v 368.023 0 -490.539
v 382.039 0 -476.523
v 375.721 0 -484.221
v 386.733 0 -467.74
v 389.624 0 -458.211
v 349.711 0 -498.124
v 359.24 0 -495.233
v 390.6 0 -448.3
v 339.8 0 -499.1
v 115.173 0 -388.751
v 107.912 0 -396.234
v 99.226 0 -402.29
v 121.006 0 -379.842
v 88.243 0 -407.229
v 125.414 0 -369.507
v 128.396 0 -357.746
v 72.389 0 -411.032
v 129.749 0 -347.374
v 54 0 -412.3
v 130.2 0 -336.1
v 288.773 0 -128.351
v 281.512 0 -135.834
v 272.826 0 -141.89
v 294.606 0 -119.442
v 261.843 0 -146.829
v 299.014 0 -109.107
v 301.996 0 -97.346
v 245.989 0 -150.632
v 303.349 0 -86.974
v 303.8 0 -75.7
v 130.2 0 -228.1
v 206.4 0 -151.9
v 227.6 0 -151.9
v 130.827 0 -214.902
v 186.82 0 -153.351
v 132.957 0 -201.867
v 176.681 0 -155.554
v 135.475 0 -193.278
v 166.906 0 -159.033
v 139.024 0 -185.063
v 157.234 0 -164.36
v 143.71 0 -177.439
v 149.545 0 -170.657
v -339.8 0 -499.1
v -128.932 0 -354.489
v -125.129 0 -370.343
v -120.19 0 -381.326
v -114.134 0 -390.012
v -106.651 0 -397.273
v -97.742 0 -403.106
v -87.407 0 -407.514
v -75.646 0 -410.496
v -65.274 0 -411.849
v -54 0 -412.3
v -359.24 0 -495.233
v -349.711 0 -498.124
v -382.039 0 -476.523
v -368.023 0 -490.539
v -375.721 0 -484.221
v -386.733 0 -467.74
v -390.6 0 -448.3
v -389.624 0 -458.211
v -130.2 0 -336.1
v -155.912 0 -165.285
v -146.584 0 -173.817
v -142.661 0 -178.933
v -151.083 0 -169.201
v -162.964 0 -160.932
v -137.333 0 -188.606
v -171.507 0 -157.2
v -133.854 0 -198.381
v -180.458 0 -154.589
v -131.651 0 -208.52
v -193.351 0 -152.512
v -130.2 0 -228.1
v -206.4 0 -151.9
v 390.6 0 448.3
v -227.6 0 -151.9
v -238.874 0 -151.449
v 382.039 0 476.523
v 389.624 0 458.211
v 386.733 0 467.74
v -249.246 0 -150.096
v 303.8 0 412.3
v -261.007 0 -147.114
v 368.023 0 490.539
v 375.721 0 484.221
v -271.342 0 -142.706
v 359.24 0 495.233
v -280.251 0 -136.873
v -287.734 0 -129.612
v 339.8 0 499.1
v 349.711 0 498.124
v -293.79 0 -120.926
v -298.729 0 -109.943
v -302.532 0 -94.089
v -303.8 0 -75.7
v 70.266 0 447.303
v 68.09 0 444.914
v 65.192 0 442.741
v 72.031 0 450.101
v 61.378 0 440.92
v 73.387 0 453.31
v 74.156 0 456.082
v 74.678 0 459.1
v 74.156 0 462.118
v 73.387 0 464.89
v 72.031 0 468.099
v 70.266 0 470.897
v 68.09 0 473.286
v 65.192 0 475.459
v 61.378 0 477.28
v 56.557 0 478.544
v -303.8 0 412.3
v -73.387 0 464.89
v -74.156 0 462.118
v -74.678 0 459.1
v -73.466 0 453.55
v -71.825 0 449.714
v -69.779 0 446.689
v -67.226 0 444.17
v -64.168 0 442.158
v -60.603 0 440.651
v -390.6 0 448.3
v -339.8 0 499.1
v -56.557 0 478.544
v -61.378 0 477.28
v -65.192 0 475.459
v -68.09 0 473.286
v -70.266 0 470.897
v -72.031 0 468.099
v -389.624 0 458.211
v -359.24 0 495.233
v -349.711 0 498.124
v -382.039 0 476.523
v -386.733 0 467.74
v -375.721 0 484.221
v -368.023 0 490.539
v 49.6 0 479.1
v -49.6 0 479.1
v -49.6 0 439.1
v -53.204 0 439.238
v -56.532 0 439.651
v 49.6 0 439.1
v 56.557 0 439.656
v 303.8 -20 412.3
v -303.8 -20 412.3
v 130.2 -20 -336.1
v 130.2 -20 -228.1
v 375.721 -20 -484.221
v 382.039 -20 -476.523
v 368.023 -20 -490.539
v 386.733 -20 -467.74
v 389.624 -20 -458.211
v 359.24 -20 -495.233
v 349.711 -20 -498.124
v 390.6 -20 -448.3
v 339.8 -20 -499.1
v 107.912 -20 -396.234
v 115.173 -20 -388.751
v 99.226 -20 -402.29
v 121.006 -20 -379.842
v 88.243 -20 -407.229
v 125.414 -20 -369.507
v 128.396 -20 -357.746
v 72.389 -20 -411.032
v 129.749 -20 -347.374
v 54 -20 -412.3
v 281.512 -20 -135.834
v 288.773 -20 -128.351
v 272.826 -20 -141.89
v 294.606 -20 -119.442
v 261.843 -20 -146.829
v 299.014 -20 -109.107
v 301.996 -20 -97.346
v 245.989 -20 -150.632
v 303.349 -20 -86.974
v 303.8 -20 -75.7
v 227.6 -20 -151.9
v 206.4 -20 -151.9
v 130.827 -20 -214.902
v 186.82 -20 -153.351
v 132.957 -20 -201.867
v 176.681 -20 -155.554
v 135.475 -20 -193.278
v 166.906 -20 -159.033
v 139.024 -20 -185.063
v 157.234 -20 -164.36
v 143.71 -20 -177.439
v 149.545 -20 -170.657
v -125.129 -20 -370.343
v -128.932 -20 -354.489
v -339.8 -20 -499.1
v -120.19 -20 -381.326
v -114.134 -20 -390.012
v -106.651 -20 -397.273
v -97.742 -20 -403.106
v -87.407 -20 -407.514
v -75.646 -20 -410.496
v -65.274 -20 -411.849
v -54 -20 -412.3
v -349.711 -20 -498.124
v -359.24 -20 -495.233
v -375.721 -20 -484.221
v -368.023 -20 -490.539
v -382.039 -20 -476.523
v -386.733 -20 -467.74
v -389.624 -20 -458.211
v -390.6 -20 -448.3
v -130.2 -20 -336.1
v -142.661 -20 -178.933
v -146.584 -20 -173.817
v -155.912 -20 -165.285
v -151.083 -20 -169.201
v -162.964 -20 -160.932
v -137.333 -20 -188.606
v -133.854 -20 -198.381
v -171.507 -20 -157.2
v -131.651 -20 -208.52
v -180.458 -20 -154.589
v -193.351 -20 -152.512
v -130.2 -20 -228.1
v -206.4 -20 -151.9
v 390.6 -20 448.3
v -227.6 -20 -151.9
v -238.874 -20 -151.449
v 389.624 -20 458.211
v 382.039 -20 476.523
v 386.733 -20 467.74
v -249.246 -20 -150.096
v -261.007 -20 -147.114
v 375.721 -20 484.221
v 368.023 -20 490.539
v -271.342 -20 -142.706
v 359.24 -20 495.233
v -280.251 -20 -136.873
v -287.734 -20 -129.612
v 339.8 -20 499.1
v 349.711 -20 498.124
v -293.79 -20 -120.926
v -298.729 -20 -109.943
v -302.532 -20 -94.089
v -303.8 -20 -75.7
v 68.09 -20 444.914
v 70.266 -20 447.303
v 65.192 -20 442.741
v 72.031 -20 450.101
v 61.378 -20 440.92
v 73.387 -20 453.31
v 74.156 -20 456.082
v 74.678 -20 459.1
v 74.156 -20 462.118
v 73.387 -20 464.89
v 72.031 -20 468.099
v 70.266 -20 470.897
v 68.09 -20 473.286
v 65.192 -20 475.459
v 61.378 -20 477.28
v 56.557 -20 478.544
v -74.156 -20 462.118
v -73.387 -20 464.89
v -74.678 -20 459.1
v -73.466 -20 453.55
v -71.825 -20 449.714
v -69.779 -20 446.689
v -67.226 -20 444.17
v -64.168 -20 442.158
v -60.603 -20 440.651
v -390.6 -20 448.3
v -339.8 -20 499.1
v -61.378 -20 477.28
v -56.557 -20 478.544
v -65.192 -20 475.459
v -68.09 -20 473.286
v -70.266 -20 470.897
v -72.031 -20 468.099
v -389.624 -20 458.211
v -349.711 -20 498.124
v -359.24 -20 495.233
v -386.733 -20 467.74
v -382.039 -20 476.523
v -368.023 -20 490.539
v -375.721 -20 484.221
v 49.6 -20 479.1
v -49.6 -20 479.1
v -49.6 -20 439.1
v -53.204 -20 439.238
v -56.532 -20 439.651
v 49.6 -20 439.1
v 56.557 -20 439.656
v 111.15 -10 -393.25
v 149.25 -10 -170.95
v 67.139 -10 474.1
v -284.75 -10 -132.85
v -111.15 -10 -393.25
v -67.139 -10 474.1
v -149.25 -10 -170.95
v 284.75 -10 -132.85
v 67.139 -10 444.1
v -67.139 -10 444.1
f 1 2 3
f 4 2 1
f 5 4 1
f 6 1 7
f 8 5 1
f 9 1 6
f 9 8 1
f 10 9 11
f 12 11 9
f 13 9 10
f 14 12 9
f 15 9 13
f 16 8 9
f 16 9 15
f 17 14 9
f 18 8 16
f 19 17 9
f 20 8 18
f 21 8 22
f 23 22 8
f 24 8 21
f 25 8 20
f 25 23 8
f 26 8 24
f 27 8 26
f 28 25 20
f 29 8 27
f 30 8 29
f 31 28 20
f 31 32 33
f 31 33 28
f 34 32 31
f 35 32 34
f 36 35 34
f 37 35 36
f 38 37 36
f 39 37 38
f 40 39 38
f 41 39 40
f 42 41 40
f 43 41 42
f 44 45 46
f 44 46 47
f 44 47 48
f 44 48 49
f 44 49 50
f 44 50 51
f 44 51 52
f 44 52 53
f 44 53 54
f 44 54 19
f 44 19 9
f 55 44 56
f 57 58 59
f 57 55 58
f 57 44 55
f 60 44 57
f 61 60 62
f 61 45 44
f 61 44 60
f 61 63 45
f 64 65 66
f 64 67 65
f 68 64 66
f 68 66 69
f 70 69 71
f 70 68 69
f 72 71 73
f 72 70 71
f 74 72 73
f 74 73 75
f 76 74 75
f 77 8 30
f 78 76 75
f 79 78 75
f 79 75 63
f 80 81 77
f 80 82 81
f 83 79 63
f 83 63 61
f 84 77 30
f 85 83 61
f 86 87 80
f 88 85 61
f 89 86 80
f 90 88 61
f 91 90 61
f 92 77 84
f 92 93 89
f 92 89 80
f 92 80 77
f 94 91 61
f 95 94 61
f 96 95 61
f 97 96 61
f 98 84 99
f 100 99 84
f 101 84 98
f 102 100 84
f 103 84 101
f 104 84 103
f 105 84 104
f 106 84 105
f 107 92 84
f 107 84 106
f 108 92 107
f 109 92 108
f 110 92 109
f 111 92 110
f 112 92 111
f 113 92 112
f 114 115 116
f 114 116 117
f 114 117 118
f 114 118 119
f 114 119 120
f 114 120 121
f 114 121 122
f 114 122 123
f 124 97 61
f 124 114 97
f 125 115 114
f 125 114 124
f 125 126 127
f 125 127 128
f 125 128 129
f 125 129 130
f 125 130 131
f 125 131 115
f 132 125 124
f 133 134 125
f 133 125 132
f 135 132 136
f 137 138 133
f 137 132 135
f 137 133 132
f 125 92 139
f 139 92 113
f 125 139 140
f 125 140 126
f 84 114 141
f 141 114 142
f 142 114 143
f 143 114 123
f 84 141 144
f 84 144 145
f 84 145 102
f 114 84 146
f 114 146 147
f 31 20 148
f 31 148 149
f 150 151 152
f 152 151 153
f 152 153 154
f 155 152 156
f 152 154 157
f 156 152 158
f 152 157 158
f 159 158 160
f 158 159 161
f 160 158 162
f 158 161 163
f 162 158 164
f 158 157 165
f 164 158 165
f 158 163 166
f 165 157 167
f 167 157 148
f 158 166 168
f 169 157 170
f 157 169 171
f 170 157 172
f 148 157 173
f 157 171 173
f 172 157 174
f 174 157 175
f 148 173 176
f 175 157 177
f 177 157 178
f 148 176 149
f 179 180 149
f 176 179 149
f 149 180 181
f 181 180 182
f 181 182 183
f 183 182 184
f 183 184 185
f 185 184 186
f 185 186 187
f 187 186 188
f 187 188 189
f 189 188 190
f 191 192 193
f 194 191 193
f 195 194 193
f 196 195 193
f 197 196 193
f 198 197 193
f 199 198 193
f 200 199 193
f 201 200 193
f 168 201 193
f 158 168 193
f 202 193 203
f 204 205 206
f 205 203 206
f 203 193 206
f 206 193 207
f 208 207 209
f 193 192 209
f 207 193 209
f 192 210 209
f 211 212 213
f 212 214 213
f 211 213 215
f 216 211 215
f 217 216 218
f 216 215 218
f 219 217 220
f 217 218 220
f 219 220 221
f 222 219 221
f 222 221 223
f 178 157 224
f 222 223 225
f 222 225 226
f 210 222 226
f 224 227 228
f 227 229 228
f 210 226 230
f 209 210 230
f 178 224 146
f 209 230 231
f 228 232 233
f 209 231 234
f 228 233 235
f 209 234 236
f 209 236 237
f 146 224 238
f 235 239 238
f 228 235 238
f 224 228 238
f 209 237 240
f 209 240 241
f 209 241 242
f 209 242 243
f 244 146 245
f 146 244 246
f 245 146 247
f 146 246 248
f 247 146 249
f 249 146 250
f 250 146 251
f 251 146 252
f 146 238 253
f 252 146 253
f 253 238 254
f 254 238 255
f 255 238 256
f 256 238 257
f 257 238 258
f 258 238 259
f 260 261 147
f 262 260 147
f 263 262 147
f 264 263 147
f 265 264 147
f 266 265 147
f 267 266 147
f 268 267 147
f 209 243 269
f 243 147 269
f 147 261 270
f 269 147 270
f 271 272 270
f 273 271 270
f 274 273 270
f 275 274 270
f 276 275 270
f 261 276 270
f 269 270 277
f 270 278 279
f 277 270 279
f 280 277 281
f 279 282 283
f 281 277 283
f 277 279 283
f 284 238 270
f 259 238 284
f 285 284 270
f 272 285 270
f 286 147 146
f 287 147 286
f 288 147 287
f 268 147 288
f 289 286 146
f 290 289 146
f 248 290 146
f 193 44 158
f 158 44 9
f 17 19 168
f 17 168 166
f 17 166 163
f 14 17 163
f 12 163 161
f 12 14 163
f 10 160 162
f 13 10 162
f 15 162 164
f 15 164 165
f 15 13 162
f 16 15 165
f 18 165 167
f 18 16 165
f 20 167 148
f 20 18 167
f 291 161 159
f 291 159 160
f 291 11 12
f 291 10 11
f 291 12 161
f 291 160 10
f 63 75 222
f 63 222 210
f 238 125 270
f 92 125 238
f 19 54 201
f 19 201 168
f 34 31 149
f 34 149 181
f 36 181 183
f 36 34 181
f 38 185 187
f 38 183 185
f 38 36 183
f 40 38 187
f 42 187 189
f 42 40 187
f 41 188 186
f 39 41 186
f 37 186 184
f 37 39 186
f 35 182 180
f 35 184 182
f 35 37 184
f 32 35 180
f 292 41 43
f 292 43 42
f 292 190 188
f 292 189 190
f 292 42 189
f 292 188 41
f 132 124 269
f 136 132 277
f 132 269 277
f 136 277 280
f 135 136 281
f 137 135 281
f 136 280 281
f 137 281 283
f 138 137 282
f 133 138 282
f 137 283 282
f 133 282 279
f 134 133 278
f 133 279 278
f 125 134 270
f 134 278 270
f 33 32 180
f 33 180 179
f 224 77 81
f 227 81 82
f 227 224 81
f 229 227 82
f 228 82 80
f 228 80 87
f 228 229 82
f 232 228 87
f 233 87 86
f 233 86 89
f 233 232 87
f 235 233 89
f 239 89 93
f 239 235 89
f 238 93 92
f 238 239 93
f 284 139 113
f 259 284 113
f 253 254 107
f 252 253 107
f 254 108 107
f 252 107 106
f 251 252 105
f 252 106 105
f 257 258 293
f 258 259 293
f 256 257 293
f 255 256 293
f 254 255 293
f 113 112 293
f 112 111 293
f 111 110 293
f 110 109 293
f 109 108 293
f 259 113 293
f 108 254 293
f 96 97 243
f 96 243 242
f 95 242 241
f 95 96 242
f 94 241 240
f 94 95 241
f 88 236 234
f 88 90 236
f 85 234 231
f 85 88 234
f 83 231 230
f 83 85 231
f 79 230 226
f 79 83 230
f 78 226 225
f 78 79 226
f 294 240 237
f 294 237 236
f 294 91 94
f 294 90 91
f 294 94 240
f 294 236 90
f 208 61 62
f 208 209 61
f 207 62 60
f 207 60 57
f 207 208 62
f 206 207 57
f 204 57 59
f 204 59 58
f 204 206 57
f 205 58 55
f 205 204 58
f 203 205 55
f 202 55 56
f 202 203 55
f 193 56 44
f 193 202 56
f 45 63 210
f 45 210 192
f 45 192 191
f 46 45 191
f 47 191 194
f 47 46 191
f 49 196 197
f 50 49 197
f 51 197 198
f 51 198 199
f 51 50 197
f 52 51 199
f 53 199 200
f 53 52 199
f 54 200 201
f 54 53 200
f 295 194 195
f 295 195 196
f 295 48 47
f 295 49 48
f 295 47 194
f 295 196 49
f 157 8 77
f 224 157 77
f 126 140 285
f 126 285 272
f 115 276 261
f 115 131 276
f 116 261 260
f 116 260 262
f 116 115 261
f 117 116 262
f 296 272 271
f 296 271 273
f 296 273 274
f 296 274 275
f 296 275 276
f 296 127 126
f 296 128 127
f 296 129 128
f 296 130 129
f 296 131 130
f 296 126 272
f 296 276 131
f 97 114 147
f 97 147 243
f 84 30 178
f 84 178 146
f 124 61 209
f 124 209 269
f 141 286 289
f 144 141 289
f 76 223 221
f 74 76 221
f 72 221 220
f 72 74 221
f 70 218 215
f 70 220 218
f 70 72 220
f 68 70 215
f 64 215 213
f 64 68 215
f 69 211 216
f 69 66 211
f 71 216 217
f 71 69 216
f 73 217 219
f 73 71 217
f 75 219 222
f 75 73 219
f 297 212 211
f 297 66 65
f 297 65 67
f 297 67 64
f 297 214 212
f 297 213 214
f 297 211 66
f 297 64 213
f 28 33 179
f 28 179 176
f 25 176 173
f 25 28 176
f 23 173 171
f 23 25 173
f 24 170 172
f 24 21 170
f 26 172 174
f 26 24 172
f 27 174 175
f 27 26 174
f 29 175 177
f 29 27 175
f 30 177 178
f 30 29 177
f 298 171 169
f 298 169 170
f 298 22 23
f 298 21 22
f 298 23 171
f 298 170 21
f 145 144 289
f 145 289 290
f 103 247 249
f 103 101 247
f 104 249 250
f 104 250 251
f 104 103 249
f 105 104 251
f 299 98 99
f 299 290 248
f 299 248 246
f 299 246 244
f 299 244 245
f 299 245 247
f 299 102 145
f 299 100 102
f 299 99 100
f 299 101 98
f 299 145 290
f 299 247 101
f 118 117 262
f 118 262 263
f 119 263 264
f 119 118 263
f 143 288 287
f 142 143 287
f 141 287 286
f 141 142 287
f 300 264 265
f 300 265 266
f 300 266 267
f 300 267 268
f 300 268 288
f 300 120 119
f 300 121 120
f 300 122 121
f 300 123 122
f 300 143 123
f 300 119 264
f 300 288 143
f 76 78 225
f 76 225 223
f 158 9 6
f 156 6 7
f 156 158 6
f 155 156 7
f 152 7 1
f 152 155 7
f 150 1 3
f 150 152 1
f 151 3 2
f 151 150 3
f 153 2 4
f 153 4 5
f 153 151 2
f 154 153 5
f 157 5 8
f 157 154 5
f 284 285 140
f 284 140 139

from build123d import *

# Parameters (mm, degrees)
F0_W         = 781.2
F0_H         = 998.2
F1_DEPTH     = 20
F2_R         = 50.8
F4_DEPTH     = 25.4
F5_T1_DEPTH  = 20
F5_T3_DEPTH  = 401
F6_W         = 260.4
F6_H         = 46.8
F7_DEPTH     = 25.4
F8_W         = 150
F8_H         = 40
F9_DEPTH     = 20.0010001
F10_T1_DEPTH = 20


# Not quite as in the source:
# - a fillet or chamfer that OpenCascade refuses, or shapes differently, is made with other operations: its cross-section is extruded or revolved along the edge and cut away or added


with BuildPart() as f1:
    # F0 (on Front) → F1 (new body)
    with BuildSketch(Plane.XZ):
        Rectangle(F0_W, F0_H)
    extrude(amount=F1_DEPTH)

    # F2
    f2_edges = [f1.edges().sort_by_distance(p)[0] for p in [
        (-390.6, -10, 499.1),
        (390.6, -10, 499.1),
        (390.6, -10, -499.1),
        (-390.6, -10, -499.1),
    ]]
    fillet(f2_edges, radius=F2_R)

    # F3 (on Front) → F4 (cut)
    with BuildSketch(Plane.XZ):
        Polygon((303.8, 412.3), (-303.8, 412.3), (-303.8, -151.9), (-130.2, -151.9), (-130.2, -412.3), (130.2, -412.3), (130.2, -151.9), (303.8, -151.9), align=None)
    extrude(amount=F4_DEPTH, mode=Mode.SUBTRACT)

    # F5: fillet of radius 76.2 on 6 edges, made by hand

    # F5_s2 → F5_t1 (join)
    with BuildSketch(Plane.XZ):
        with BuildLine():
            add(Edge.make_bspline(
                [(-303.8, -75.7), (-303.8, -151.9), (-227.6, -151.9)],
                knots=[0, 0, 0, 1, 1, 1], degree=2, weights=[1, 1, 1]))
            Line((-227.6, -151.9), (-303.8, -151.9))
            Line((-303.8, -151.9), (-303.8, -75.7))
        make_face()
        with BuildLine():
            add(Edge.make_bspline(
                [(-130.2, -336.1), (-130.2, -412.3), (-54, -412.3)],
                knots=[0, 0, 0, 1, 1, 1], degree=2, weights=[1, 1, 1]))
            Line((-54, -412.3), (-130.2, -412.3))
            Line((-130.2, -412.3), (-130.2, -336.1))
        make_face()
        with BuildLine():
            add(Edge.make_bspline(
                [(227.6, -151.9), (303.8, -151.9), (303.8, -75.7)],
                knots=[0, 0, 0, 1, 1, 1], degree=2, weights=[1, 1, 1]))
            Line((303.8, -75.7), (303.8, -151.9))
            Line((303.8, -151.9), (227.6, -151.9))
        make_face()
        with BuildLine():
            add(Edge.make_bspline(
                [(54, -412.3), (130.2, -412.3), (130.2, -336.1)],
                knots=[0, 0, 0, 1, 1, 1], degree=2, weights=[1, 1, 1]))
            Line((130.2, -336.1), (130.2, -412.3))
            Line((130.2, -412.3), (54, -412.3))
        make_face()
    extrude(amount=F5_T1_DEPTH)

    # F5_s4 → F5_t3 (cut)
    with BuildSketch(Plane.XZ.offset(-190.5)):
        with BuildLine():
            add(Edge.make_bspline(
                [(-206.4, -151.9), (-130.2, -151.9), (-130.2, -228.1)],
                knots=[0, 0, 0, 1, 1, 1], degree=2, weights=[1, 1, 1]))
            Line((-130.2, -228.1), (-130.2, -151.9))
            Line((-130.2, -151.9), (-206.4, -151.9))
        make_face()
        with BuildLine():
            add(Edge.make_bspline(
                [(130.2, -228.1), (130.2, -151.9), (206.4, -151.9)],
                knots=[0, 0, 0, 1, 1, 1], degree=2, weights=[1, 1, 1]))
            Line((206.4, -151.9), (130.2, -151.9))
            Line((130.2, -151.9), (130.2, -228.1))
        make_face()
    extrude(amount=F5_T3_DEPTH, mode=Mode.SUBTRACT)

    # F6 (on Front) → F7 (cut)
    with BuildSketch(Plane.XZ):
        with Locations((0, 455.7)):
            Rectangle(F6_W, F6_H)
    extrude(amount=-F7_DEPTH, mode=Mode.SUBTRACT)

    # F8 (on face) → F9 (cut, through all)
    with BuildSketch(Plane.XZ.offset(20)):
        with Locations((0, 459.1)):
            Rectangle(F8_W, F8_H)
    extrude(amount=-F9_DEPTH, mode=Mode.SUBTRACT)

    # F10: fillet of radius 25.4 on 4 edges, made by hand

    # F10_s2 → F10_t1 (join)
    with BuildSketch(Plane.XZ):
        with BuildLine():
            add(Edge.make_bspline(
                [(-49.6, 479.1), (-75, 479.1), (-75, 453.7)],
                knots=[0, 0, 0, 1, 1, 1], degree=2, weights=[1, 1, 1]))
            Line((-75, 453.7), (-75, 479.1))
            Line((-75, 479.1), (-49.6, 479.1))
        make_face()
        with BuildLine():
            add(Edge.make_bspline(
                [(-75, 464.5), (-75, 439.1), (-49.6, 439.1)],
                knots=[0, 0, 0, 1, 1, 1], degree=2, weights=[1, 1, 1]))
            Line((-49.6, 439.1), (-75, 439.1))
            Line((-75, 439.1), (-75, 464.5))
        make_face()
        with BuildLine():
            add(Edge.make_bspline(
                [(49.6, 479.1), (75, 479.1), (75, 453.7)],
                knots=[0, 0, 0, 1, 1, 1], degree=2, weights=[1, 1, 1]))
            Line((75, 453.7), (75, 479.1))
            Line((75, 479.1), (49.6, 479.1))
        make_face()
        with BuildLine():
            add(Edge.make_bspline(
                [(49.6, 439.1), (75, 439.1), (75, 464.5)],
                knots=[0, 0, 0, 1, 1, 1], degree=2, weights=[1, 1, 1]))
            Line((75, 464.5), (75, 439.1))
            Line((75, 439.1), (49.6, 439.1))
        make_face()
    extrude(amount=F10_T1_DEPTH)


solid = f1.part
